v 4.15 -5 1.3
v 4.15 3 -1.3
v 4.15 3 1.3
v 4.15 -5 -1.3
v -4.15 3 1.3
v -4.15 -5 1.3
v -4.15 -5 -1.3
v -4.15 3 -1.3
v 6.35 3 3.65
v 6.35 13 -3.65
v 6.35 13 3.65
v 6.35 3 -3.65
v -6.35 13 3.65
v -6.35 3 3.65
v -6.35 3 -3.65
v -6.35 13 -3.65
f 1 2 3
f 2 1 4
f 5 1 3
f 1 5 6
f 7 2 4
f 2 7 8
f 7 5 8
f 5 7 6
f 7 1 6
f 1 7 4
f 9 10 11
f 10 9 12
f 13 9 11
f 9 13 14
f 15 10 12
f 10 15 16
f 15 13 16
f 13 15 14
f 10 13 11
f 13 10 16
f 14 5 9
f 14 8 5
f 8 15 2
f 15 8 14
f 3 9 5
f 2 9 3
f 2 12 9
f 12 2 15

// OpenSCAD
$fn=30;

module usbc() {
    cube([8.3, 10, 2.6], center=true);
    translate([0,8, 0]) cube([12.7, 10, 7.3], center=true);
    // 4.9, 2.8
}

usbc();
